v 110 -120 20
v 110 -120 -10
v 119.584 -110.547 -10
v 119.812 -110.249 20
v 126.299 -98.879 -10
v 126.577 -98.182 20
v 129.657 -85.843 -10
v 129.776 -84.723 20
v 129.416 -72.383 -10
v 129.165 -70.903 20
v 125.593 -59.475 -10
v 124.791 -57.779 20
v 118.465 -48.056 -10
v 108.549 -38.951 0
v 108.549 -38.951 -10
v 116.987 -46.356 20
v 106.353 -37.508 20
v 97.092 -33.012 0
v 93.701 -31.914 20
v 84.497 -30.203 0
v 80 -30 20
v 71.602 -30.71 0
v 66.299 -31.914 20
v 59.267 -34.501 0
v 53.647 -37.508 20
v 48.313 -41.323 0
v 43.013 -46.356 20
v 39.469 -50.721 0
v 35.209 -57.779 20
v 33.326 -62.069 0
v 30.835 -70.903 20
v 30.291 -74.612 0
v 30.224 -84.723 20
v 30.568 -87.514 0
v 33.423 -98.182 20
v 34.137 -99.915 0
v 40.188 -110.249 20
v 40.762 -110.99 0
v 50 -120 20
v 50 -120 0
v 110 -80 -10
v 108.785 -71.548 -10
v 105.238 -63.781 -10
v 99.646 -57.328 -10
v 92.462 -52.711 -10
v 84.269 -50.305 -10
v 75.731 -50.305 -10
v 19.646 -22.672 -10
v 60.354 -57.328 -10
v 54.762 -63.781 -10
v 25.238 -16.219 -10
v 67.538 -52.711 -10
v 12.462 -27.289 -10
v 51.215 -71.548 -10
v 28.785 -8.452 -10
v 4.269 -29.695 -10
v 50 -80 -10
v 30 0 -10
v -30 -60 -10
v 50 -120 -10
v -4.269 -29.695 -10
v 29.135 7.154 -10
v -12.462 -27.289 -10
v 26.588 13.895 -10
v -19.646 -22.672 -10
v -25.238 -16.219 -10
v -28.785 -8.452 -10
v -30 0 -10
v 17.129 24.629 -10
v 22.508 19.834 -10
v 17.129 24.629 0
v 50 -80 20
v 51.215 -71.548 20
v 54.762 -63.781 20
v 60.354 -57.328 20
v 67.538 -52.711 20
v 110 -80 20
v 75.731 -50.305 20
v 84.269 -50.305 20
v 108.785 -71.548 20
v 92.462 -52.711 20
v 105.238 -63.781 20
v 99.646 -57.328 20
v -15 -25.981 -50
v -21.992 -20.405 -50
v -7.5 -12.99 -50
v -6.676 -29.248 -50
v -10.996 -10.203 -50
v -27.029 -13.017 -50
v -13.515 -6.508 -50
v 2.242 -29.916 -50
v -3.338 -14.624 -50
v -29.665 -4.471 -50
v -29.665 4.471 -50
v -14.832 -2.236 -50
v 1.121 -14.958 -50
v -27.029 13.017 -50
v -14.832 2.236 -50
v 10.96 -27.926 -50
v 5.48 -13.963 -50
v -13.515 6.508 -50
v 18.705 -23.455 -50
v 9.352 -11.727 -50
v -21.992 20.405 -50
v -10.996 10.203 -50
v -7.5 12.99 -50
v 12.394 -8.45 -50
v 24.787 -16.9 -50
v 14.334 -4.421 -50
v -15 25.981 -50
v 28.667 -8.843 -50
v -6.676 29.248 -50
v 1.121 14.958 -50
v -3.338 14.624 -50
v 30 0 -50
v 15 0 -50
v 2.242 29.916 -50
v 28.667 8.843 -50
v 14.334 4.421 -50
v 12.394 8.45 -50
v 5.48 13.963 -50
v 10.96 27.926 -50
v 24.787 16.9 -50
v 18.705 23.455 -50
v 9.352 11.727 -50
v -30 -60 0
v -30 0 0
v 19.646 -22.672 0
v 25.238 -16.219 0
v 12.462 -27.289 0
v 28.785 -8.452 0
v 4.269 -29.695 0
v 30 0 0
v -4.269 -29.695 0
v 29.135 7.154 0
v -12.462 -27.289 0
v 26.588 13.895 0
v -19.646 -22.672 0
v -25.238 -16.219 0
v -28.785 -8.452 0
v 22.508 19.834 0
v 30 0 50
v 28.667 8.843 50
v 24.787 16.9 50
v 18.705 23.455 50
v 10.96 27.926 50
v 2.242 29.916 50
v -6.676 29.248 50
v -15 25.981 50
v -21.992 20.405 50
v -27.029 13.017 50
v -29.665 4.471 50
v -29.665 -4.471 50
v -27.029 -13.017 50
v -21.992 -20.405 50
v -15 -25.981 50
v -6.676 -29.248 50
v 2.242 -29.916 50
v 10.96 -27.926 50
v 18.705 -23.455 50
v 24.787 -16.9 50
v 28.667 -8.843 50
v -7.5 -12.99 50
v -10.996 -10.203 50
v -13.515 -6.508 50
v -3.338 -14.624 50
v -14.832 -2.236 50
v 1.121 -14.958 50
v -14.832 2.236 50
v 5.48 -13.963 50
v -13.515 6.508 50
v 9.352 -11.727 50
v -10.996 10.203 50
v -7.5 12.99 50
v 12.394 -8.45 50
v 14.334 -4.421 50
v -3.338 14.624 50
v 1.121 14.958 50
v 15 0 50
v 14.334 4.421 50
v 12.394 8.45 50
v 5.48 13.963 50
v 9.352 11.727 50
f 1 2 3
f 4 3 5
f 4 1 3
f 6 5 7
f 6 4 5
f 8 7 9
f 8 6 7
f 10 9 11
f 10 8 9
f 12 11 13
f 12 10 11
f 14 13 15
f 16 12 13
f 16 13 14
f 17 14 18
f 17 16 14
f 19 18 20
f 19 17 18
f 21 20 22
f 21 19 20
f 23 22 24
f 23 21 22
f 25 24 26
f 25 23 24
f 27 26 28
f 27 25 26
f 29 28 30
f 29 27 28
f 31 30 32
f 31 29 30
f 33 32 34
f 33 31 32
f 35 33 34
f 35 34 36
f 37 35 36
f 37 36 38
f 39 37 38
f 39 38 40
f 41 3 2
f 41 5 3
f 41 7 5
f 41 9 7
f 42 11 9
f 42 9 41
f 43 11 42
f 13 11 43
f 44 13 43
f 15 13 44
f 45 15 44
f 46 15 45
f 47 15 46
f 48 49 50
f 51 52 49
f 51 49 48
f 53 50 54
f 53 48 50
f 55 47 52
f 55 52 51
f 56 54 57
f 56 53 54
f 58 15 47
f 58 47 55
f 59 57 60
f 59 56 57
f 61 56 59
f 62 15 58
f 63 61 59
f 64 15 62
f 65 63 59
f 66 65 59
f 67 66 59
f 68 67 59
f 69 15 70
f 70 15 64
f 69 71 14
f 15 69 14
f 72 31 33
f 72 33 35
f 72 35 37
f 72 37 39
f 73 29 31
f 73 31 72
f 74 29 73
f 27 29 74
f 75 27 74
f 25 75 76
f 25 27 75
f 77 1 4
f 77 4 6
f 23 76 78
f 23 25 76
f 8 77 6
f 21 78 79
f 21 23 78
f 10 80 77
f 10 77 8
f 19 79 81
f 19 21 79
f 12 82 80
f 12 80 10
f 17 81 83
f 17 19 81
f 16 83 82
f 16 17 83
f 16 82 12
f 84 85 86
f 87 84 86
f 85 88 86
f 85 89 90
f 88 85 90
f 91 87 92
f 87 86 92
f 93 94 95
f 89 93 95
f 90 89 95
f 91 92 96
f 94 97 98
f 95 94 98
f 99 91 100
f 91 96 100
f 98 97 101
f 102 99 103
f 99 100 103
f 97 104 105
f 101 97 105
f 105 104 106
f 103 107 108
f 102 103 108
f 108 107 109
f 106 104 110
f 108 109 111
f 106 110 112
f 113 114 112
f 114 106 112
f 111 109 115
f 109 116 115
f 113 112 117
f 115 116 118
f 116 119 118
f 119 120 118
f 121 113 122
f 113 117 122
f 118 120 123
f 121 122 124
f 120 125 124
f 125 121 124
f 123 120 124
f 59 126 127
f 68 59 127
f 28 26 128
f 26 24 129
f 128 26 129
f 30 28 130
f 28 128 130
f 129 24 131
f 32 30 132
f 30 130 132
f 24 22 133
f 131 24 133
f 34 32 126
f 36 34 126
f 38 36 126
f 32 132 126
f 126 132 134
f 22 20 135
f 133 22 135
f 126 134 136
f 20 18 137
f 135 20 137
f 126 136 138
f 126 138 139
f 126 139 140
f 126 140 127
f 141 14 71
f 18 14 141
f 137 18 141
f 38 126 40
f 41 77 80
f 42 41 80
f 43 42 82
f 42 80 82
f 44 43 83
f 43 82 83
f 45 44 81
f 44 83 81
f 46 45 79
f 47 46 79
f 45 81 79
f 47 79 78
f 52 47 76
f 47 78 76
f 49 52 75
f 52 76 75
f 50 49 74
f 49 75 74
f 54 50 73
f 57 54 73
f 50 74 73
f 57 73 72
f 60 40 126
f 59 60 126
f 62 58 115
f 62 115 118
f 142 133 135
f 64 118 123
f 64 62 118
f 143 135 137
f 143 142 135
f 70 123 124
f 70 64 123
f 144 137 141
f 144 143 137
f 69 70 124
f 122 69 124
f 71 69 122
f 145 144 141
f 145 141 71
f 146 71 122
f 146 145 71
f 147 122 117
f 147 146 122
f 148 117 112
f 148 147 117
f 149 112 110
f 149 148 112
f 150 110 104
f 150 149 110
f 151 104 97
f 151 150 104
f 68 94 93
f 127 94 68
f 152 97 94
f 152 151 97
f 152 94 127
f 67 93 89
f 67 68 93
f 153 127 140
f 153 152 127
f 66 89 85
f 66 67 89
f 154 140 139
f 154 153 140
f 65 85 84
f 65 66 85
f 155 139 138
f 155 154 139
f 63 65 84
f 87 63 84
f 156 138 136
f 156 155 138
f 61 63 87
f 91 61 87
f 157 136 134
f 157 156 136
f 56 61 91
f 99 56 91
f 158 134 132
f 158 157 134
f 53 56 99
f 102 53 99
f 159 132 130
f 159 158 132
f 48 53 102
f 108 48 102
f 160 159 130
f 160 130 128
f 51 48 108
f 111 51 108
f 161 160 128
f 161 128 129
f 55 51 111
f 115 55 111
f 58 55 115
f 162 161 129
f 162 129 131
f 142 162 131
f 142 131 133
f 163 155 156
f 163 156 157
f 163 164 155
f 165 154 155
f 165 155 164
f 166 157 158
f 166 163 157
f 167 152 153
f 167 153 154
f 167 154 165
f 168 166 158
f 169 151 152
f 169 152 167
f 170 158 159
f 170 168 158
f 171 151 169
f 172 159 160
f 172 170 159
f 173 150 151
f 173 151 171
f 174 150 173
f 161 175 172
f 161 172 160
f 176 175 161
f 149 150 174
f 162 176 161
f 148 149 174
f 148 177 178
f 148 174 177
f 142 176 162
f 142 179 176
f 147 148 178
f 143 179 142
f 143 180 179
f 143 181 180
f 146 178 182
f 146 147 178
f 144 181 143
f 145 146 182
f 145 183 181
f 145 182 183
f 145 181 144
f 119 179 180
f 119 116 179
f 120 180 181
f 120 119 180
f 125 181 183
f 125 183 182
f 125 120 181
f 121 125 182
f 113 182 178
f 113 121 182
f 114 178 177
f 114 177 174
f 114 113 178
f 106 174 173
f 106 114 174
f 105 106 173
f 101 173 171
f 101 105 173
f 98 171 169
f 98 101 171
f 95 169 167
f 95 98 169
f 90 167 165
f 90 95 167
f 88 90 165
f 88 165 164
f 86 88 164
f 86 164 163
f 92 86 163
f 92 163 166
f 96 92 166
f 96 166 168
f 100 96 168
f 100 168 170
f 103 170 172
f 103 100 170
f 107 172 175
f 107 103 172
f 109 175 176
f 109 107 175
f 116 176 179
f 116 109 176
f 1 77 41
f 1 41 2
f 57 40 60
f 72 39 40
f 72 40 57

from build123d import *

# Parameters (mm, degrees)
SKETCH1_R                = 30
SKETCH1_R_2              = 15
BOSS_EXTRUDE1_DEPTH      = 50
BOSS_EXTRUDE1_DEPTH_BACK = 50
BOSS_EXTRUDE2_DEPTH      = 20
BOSS_EXTRUDE2_DEPTH_BACK = 10
BOSS_EXTRUDE3_DEPTH      = 10
SKETCH9_R                = 15
CUT_EXTRUDE1_DEPTH       = 51
CUT_EXTRUDE1_DEPTH_BACK  = 51


with BuildPart() as part:
    # Sketch1 → Boss-Extrude1 (new body, two sides)
    with BuildSketch(Plane.XY) as boss_extrude1_sk:
        Circle(SKETCH1_R)
        Circle(SKETCH1_R_2, mode=Mode.SUBTRACT)
    extrude(amount=BOSS_EXTRUDE1_DEPTH)
    extrude(boss_extrude1_sk.sketch, amount=-BOSS_EXTRUDE1_DEPTH_BACK)



with BuildPart() as body_2:
    # Sketch2 → Boss-Extrude2 (new body, two sides)
    with BuildSketch(Plane.XY) as boss_extrude2_sk:
        with BuildLine():
            Line((110, -80), (110, -120))
            ThreePointArc((110, -120), (80, -30), (50, -120))
            Line((50, -120), (50, -80))
            ThreePointArc((50, -80), (80, -50), (110, -80))
        make_face()
    extrude(amount=BOSS_EXTRUDE2_DEPTH)
    extrude(boss_extrude2_sk.sketch, amount=-BOSS_EXTRUDE2_DEPTH_BACK)


with BuildPart() as part_1:
    add(part.part)

    add(body_2.part)  # Boss-Extrude3 merges body 2
    # Sketch3 → Boss-Extrude3 (add)
    with BuildSketch(Plane.XY):
        Polygon((17.129116361, 24.629116361), (108.548527268, -38.951472732), (50, -120), (-30, -60), (-30, 0), align=None)
    extrude(amount=-BOSS_EXTRUDE3_DEPTH)

    # Sketch9 → Cut-Extrude1 (cut, two sides)
    with BuildSketch(Plane.XY) as cut_extrude1_sk:
        Circle(SKETCH9_R)
        with BuildLine():
            Line((50, -80), (50, -120))
            Line((50, -120), (110, -120))
            Line((110, -120), (110, -80))
            ThreePointArc((110, -80), (80, -50), (50, -80))
        make_face()
    extrude(amount=CUT_EXTRUDE1_DEPTH, mode=Mode.SUBTRACT)
    extrude(cut_extrude1_sk.sketch, amount=-CUT_EXTRUDE1_DEPTH_BACK, mode=Mode.SUBTRACT)


solid = part_1.part
